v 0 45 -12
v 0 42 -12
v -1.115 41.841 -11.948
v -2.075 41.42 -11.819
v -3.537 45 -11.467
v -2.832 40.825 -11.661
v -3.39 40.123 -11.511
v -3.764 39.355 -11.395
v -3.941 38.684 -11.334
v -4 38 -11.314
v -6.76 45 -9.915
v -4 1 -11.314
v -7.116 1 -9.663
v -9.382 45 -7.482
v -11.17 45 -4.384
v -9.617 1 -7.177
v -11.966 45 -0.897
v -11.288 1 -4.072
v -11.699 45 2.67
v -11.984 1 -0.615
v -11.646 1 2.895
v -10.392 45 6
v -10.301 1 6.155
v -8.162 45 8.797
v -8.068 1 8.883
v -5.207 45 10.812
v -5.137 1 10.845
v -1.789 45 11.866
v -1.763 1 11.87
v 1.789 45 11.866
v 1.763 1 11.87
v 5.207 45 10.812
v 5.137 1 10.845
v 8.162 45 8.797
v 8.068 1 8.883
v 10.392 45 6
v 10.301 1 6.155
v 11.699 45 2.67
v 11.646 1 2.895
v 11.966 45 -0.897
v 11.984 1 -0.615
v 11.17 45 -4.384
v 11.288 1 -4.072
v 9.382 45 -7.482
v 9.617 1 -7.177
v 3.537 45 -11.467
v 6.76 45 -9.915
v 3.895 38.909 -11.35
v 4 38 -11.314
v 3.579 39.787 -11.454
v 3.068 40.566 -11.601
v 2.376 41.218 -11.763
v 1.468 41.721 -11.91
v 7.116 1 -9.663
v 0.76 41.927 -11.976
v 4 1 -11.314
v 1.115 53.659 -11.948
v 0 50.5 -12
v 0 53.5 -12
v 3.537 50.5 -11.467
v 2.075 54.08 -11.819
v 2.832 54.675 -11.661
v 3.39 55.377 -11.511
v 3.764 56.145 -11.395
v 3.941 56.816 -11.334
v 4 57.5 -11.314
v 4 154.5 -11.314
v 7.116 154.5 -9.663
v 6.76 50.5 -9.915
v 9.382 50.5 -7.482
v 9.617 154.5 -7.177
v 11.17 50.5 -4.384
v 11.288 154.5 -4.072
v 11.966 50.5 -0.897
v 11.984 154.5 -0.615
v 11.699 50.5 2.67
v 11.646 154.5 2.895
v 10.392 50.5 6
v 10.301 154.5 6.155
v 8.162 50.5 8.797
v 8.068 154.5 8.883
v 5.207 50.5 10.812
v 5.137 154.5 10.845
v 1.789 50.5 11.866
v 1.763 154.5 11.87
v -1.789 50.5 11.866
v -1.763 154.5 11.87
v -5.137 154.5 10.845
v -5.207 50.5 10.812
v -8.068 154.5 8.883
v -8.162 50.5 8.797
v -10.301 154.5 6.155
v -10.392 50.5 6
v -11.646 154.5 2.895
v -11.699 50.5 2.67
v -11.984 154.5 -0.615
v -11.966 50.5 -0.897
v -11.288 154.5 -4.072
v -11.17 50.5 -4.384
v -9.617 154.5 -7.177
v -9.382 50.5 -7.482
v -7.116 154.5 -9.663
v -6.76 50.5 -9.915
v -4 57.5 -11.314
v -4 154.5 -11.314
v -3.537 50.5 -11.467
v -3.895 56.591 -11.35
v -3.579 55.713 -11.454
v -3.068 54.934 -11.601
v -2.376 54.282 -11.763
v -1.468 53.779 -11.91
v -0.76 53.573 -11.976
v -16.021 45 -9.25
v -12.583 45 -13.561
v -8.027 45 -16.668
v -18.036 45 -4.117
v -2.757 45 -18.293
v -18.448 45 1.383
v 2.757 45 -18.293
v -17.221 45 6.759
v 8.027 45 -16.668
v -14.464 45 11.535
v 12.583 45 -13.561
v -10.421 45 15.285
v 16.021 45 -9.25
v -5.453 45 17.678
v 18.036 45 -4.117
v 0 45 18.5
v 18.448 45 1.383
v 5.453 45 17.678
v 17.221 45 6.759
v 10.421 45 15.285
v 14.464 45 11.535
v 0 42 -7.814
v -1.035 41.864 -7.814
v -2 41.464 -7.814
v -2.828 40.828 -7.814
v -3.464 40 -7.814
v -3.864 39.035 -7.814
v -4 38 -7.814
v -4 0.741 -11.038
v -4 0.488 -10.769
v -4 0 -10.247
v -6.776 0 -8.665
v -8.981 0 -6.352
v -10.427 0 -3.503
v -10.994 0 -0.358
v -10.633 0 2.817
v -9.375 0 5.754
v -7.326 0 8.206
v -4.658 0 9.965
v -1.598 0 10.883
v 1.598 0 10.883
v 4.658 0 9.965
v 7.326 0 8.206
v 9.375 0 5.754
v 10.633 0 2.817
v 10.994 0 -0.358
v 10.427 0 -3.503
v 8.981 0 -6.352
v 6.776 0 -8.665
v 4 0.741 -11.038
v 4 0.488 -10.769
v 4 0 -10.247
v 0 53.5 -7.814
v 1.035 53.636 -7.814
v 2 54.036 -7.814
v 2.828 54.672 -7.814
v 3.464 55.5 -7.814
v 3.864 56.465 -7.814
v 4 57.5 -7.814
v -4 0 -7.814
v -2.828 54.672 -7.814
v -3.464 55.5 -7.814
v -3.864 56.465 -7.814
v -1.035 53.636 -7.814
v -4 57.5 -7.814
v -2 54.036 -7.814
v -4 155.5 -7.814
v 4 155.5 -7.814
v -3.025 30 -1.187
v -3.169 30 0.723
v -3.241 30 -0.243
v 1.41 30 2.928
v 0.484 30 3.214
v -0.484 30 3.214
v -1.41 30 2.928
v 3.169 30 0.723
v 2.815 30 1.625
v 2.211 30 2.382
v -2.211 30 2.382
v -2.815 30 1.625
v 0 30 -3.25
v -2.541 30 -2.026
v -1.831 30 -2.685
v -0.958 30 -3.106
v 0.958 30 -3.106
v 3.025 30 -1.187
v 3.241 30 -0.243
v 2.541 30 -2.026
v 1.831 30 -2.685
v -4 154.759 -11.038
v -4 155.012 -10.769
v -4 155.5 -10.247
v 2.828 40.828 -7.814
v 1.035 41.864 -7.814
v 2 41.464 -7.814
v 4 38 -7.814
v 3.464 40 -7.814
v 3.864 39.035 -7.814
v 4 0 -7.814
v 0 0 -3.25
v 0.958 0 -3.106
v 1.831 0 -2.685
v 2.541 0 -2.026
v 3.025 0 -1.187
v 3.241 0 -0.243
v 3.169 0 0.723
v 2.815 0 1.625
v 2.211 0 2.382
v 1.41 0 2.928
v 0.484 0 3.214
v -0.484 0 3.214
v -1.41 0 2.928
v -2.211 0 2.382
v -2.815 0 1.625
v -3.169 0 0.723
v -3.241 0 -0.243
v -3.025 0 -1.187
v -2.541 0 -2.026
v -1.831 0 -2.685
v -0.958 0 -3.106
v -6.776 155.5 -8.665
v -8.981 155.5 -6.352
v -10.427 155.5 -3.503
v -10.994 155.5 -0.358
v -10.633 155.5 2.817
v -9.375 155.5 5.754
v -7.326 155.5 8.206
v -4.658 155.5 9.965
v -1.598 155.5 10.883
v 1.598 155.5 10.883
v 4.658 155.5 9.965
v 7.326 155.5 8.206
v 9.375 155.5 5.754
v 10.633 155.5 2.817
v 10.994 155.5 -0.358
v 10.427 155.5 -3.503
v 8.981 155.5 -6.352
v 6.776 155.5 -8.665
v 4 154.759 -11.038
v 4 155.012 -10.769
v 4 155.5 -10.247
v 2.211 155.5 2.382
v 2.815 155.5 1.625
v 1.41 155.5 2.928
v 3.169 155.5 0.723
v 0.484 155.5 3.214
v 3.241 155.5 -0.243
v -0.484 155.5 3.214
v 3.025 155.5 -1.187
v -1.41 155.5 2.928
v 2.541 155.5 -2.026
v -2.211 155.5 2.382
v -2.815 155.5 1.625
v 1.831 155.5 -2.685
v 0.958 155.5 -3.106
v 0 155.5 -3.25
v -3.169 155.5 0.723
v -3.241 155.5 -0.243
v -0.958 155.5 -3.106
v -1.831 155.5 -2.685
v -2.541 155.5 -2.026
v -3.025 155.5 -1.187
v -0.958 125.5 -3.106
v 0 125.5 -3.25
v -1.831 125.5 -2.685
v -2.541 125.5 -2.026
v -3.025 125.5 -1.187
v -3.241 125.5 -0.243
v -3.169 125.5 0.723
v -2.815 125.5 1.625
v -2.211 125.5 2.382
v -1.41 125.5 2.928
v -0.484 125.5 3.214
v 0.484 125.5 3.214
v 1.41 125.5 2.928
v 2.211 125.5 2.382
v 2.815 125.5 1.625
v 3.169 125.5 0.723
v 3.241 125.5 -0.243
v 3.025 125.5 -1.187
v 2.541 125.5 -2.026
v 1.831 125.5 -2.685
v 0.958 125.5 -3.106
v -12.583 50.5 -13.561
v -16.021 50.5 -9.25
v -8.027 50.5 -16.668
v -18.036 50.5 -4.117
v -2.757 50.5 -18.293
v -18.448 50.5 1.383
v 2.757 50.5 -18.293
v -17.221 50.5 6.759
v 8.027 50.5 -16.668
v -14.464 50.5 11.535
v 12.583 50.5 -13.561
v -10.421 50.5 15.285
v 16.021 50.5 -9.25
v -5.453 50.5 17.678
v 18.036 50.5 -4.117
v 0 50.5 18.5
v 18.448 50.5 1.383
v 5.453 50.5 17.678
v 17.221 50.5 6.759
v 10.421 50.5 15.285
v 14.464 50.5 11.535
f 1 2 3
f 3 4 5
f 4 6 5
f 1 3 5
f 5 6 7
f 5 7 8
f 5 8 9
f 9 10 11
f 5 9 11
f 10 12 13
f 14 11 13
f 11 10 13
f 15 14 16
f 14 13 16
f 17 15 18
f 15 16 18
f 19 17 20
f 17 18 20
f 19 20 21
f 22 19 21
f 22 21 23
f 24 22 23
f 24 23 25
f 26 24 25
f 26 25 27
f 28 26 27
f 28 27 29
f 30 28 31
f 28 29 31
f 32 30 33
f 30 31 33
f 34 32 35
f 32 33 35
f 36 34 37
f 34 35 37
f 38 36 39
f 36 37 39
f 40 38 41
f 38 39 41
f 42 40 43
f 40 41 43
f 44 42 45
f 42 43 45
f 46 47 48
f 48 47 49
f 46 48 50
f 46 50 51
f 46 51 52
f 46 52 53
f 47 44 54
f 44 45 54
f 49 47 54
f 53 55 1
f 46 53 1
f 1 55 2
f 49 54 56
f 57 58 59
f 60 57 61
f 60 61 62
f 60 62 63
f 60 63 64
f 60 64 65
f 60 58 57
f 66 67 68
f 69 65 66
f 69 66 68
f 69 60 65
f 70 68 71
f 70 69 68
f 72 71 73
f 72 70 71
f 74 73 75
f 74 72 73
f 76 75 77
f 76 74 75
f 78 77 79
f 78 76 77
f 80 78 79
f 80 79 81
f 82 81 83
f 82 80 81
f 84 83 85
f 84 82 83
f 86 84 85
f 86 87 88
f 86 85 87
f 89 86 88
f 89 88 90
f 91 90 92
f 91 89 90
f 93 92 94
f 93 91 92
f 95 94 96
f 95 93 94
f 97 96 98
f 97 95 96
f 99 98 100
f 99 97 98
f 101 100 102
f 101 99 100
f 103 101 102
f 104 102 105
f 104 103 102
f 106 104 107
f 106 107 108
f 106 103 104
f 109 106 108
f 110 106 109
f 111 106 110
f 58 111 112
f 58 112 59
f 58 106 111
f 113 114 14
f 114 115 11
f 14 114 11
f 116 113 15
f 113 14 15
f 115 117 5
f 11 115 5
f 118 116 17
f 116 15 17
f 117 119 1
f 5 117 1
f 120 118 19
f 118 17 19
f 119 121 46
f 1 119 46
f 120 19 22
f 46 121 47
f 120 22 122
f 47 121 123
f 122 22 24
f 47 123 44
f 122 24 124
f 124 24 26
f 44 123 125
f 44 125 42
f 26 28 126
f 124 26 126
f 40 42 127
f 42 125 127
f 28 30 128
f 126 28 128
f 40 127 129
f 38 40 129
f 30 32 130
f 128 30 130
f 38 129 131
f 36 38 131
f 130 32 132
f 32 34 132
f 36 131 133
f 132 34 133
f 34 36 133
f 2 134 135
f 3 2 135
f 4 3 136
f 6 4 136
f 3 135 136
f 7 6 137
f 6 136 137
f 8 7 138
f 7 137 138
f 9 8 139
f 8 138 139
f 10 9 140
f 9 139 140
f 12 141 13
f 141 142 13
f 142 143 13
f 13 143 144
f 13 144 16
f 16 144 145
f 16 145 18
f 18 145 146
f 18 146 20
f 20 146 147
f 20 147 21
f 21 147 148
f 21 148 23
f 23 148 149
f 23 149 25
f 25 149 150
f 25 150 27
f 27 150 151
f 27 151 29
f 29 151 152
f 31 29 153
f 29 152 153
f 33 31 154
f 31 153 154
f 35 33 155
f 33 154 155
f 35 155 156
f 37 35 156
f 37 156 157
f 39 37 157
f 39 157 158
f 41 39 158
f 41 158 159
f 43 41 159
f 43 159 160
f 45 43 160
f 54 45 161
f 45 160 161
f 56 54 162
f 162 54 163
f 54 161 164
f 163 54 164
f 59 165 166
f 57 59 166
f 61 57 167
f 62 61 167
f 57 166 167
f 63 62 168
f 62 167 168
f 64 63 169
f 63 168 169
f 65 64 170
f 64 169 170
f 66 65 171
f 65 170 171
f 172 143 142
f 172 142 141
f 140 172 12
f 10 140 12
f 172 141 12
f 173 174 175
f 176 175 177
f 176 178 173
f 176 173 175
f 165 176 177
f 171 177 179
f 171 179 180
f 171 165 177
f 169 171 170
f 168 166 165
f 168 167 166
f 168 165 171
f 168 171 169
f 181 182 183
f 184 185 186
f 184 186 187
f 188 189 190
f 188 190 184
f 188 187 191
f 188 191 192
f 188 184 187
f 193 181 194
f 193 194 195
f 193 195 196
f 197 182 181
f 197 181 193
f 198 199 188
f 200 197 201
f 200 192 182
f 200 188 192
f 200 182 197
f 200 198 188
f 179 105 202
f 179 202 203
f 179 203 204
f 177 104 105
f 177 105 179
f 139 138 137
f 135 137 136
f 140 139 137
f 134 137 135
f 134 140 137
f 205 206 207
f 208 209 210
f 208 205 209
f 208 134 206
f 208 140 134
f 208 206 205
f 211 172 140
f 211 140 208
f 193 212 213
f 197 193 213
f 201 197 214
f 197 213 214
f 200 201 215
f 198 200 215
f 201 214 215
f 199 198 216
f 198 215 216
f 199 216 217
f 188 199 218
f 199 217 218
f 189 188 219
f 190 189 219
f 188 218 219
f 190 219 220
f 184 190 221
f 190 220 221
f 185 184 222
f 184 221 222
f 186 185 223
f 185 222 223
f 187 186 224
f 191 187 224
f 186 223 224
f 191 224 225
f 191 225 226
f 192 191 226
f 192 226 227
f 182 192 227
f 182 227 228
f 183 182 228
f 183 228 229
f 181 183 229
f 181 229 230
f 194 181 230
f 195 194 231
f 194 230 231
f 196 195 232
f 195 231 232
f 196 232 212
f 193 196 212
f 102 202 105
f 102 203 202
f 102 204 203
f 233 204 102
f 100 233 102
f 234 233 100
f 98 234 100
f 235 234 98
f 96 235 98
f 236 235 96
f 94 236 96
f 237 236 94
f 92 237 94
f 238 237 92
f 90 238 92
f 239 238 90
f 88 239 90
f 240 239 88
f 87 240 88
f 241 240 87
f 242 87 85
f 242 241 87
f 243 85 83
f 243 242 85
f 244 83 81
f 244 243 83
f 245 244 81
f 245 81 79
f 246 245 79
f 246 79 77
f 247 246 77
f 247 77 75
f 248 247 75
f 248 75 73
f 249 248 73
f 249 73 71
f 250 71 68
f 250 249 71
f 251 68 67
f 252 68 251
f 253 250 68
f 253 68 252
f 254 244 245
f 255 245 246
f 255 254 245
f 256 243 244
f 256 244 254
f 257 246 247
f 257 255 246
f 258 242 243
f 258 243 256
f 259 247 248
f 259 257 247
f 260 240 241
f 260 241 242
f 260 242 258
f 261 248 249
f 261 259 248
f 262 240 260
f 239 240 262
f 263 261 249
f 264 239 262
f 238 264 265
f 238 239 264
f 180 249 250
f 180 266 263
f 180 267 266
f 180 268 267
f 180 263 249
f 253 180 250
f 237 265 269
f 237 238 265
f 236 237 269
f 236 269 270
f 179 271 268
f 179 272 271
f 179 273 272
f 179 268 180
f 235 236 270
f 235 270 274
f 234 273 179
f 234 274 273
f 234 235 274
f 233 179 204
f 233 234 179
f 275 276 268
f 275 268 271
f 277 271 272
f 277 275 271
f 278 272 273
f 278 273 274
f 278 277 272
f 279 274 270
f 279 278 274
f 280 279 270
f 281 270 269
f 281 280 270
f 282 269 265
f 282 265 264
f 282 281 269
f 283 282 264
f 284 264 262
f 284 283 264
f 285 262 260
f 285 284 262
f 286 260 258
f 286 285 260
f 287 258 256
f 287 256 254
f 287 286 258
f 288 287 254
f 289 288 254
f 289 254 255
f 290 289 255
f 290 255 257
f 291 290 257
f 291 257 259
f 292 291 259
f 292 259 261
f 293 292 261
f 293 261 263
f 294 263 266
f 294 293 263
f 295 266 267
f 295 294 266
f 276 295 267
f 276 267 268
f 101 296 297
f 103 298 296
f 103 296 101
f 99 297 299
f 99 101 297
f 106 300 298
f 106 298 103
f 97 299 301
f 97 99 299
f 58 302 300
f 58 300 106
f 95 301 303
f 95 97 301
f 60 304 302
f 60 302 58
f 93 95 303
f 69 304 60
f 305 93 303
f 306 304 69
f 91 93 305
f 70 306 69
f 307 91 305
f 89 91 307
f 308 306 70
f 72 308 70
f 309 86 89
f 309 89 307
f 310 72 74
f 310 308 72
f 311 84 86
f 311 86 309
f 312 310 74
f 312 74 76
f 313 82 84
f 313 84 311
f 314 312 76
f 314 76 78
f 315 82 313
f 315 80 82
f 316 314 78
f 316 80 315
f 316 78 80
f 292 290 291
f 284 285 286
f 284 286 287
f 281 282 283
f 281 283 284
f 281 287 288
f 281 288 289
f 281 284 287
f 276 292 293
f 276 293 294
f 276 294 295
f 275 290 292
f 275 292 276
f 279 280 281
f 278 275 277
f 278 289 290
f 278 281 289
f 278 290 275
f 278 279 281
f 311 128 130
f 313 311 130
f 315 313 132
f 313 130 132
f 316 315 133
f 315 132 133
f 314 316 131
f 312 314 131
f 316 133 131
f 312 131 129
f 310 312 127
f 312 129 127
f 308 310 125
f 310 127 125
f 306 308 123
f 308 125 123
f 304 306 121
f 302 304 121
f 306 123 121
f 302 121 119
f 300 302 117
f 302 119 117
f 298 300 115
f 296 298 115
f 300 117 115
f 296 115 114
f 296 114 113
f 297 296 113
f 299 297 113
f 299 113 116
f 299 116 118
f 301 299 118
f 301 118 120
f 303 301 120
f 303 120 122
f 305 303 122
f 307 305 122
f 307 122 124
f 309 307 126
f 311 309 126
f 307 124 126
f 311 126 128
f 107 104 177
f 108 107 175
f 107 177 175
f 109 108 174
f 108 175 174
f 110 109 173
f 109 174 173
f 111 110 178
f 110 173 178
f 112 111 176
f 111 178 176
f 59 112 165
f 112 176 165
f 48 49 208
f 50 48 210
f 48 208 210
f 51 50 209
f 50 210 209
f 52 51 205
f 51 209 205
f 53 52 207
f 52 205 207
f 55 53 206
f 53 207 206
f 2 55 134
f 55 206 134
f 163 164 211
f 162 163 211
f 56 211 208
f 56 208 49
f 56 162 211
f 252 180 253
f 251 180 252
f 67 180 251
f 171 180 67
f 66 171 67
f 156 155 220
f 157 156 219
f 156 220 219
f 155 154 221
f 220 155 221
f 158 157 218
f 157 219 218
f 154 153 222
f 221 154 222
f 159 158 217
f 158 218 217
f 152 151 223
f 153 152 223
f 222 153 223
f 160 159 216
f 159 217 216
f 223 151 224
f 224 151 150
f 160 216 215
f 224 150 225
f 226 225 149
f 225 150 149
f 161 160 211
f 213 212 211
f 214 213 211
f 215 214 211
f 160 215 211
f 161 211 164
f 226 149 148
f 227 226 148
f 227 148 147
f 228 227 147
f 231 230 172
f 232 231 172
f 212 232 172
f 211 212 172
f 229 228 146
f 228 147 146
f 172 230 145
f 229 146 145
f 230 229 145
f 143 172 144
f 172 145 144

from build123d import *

# Parameters (mm, degrees)
SKETCH1_R                = 12
BOSS_EXTRUDE1_DEPTH      = 45
SKETCH2_R                = 18.5
BOSS_EXTRUDE2_DEPTH      = 5.5
SKETCH3_R                = 12
BOSS_EXTRUDE3_DEPTH      = 105
CUT_EXTRUDE1_DEPTH       = 42
BOSS_EXTRUDE4_REACH      = 160.792
BOSS_EXTRUDE4_END_RADIUS = 12
CUT_EXTRUDE2_START       = -102
CUT_EXTRUDE2_DEPTH       = 102
BOSS_EXTRUDE5_REACH      = 160.792
BOSS_EXTRUDE5_END_RADIUS = 12
SKETCH9_R                = 3.25
CUT_EXTRUDE3_DEPTH       = 30
CUT_EXTRUDE4_START       = -30
SKETCH10_R               = 3.25
CUT_EXTRUDE4_DEPTH       = 30
CHAMFER1_SIZE            = 1


with BuildPart() as part:
    # Sketch1 → Boss-Extrude1 (new body)
    with BuildSketch(Plane(origin=(0, 0, 0), x_dir=(1, 0, 0), z_dir=(0, 1, 0))):
        with Locations(Location((0, 0, 0), (0, 0, 90))):
            Circle(SKETCH1_R)
    extrude(amount=BOSS_EXTRUDE1_DEPTH)

    # Sketch2 → Boss-Extrude2 (add)
    with BuildSketch(Plane(origin=(0, 45, 0), x_dir=(1, 0, 0), z_dir=(0, 1, 0))):
        with Locations(Location((0, 0, 0), (0, 0, 270))):
            Circle(SKETCH2_R)
    extrude(amount=BOSS_EXTRUDE2_DEPTH)

    # Sketch3 → Boss-Extrude3 (add)
    with BuildSketch(Plane(origin=(0, 50.5, 0), x_dir=(1, 0, 0), z_dir=(0, 1, 0))):
        with Locations(Location((0, 0, 0), (0, 0, 90))):
            Circle(SKETCH3_R)
    extrude(amount=BOSS_EXTRUDE3_DEPTH)

    # Sketch4 → Cut-Extrude1 (cut)
    with BuildSketch(Plane.XZ):
        Polygon((-4, -12), (-4, -11.313708499), (-4, -7.813708499), (4, -7.813708499), (4, -12), align=None)
    extrude(amount=-CUT_EXTRUDE1_DEPTH, mode=Mode.SUBTRACT)

    # Boss-Extrude4: up to this cylinder (the profile starts inside it)
    boss_extrude4_end = Plane(origin=(0, 41.106528, 0), z_dir=(0, -1, 0)) * Cylinder(BOSS_EXTRUDE4_END_RADIUS, 346.584, mode=Mode.PRIVATE)
    # Sketch6 → Boss-Extrude4 (add, up to the surface)
    with BuildSketch(Plane(origin=(0, 0, -7.813708499), x_dir=(-1, 0, 0), z_dir=(0, 0, -1)), mode=Mode.PRIVATE) as boss_extrude4_sk1:
        with BuildLine():
            Line((-4, 42), (-4, 38))
            ThreePointArc((-4, 38), (-2.828427125, 40.828427125), (0, 42))
            Line((0, 42), (-4, 42))
        make_face()
    boss_extrude4_tool1 = extrude(boss_extrude4_sk1.sketch, amount=BOSS_EXTRUDE4_REACH, mode=Mode.PRIVATE) & boss_extrude4_end
    add(boss_extrude4_tool1.solids().sort_by_distance((3.106528, 41.106528, -7.813708))[0])
    # Sketch6 → Boss-Extrude4 (add, up to the surface)
    with BuildSketch(Plane(origin=(0, 0, -7.813708499), x_dir=(-1, 0, 0), z_dir=(0, 0, -1)), mode=Mode.PRIVATE) as boss_extrude4_sk2:
        with BuildLine():
            Line((4, 42), (0, 42))
            ThreePointArc((0, 42), (2.828427125, 40.828427125), (4, 38))
            Line((4, 38), (4, 42))
        make_face()
    boss_extrude4_tool2 = extrude(boss_extrude4_sk2.sketch, amount=BOSS_EXTRUDE4_REACH, mode=Mode.PRIVATE) & boss_extrude4_end
    add(boss_extrude4_tool2.solids().sort_by_distance((-3.106528, 41.106528, -7.813708))[0])

    # Sketch7 → Cut-Extrude2 (cut)
    with BuildSketch(Plane(origin=(0, 155.5, 0), x_dir=(1, 0, 0), z_dir=(0, 1, 0)).offset(CUT_EXTRUDE2_START)):
        with BuildLine():
            Line((4, 7.813708499), (4, 11.313708499))
            ThreePointArc((4, 11.313708499), (2.029223745, 11.827182716), (0, 12))
            ThreePointArc((0, 12), (-2.029223745, 11.827182716), (-4, 11.313708499))
            Line((-4, 11.313708499), (-4, 7.813708499))
            Line((-4, 7.813708499), (4, 7.813708499))
        make_face()
    extrude(amount=CUT_EXTRUDE2_DEPTH, mode=Mode.SUBTRACT)

    # Boss-Extrude5: up to this cylinder (the profile starts inside it)
    boss_extrude5_end = Plane(origin=(0, 54.393472, 0), z_dir=(0, -1, 0)) * Cylinder(BOSS_EXTRUDE5_END_RADIUS, 346.584, mode=Mode.PRIVATE)
    # Sketch8 → Boss-Extrude5 (add, up to the surface)
    with BuildSketch(Plane(origin=(0, 0, -7.813708499), x_dir=(-1, 0, 0), z_dir=(0, 0, -1)), mode=Mode.PRIVATE) as boss_extrude5_sk1:
        with BuildLine():
            Line((4, 53.5), (4, 57.5))
            ThreePointArc((4, 57.5), (2.828427125, 54.671572875), (0, 53.5))
            Line((0, 53.5), (4, 53.5))
        make_face()
    boss_extrude5_tool1 = extrude(boss_extrude5_sk1.sketch, amount=BOSS_EXTRUDE5_REACH, mode=Mode.PRIVATE) & boss_extrude5_end
    add(boss_extrude5_tool1.solids().sort_by_distance((-3.106528, 54.393472, -7.813708))[0])
    # Sketch8 → Boss-Extrude5 (add, up to the surface)
    with BuildSketch(Plane(origin=(0, 0, -7.813708499), x_dir=(-1, 0, 0), z_dir=(0, 0, -1)), mode=Mode.PRIVATE) as boss_extrude5_sk2:
        with BuildLine():
            Line((-4, 53.5), (0, 53.5))
            ThreePointArc((0, 53.5), (-2.828427125, 54.671572875), (-4, 57.5))
            Line((-4, 57.5), (-4, 53.5))
        make_face()
    boss_extrude5_tool2 = extrude(boss_extrude5_sk2.sketch, amount=BOSS_EXTRUDE5_REACH, mode=Mode.PRIVATE) & boss_extrude5_end
    add(boss_extrude5_tool2.solids().sort_by_distance((3.106528, 54.393472, -7.813708))[0])

    # Sketch9 → Cut-Extrude3 (cut)
    with BuildSketch(Plane.XZ):
        with Locations(Location((0, 0, 0), (0, 0, 270))):
            Circle(SKETCH9_R)
    extrude(amount=-CUT_EXTRUDE3_DEPTH, mode=Mode.SUBTRACT)

    # Sketch10 → Cut-Extrude4 (cut)
    with BuildSketch(Plane(origin=(0, 155.5, 0), x_dir=(1, 0, 0), z_dir=(0, 1, 0)).offset(CUT_EXTRUDE4_START)):
        with Locations(Location((0, 0, 0), (0, 0, 90))):
            Circle(SKETCH10_R)
    extrude(amount=CUT_EXTRUDE4_DEPTH, mode=Mode.SUBTRACT)

    # Chamfer1
    chamfer1_edges = [part.edges().sort_by_distance(p)[0] for p in [
        (0, 0, 12),
        (0, 155.5, 12),
    ]]
    chamfer(chamfer1_edges, length=CHAMFER1_SIZE)


solid = part.part
